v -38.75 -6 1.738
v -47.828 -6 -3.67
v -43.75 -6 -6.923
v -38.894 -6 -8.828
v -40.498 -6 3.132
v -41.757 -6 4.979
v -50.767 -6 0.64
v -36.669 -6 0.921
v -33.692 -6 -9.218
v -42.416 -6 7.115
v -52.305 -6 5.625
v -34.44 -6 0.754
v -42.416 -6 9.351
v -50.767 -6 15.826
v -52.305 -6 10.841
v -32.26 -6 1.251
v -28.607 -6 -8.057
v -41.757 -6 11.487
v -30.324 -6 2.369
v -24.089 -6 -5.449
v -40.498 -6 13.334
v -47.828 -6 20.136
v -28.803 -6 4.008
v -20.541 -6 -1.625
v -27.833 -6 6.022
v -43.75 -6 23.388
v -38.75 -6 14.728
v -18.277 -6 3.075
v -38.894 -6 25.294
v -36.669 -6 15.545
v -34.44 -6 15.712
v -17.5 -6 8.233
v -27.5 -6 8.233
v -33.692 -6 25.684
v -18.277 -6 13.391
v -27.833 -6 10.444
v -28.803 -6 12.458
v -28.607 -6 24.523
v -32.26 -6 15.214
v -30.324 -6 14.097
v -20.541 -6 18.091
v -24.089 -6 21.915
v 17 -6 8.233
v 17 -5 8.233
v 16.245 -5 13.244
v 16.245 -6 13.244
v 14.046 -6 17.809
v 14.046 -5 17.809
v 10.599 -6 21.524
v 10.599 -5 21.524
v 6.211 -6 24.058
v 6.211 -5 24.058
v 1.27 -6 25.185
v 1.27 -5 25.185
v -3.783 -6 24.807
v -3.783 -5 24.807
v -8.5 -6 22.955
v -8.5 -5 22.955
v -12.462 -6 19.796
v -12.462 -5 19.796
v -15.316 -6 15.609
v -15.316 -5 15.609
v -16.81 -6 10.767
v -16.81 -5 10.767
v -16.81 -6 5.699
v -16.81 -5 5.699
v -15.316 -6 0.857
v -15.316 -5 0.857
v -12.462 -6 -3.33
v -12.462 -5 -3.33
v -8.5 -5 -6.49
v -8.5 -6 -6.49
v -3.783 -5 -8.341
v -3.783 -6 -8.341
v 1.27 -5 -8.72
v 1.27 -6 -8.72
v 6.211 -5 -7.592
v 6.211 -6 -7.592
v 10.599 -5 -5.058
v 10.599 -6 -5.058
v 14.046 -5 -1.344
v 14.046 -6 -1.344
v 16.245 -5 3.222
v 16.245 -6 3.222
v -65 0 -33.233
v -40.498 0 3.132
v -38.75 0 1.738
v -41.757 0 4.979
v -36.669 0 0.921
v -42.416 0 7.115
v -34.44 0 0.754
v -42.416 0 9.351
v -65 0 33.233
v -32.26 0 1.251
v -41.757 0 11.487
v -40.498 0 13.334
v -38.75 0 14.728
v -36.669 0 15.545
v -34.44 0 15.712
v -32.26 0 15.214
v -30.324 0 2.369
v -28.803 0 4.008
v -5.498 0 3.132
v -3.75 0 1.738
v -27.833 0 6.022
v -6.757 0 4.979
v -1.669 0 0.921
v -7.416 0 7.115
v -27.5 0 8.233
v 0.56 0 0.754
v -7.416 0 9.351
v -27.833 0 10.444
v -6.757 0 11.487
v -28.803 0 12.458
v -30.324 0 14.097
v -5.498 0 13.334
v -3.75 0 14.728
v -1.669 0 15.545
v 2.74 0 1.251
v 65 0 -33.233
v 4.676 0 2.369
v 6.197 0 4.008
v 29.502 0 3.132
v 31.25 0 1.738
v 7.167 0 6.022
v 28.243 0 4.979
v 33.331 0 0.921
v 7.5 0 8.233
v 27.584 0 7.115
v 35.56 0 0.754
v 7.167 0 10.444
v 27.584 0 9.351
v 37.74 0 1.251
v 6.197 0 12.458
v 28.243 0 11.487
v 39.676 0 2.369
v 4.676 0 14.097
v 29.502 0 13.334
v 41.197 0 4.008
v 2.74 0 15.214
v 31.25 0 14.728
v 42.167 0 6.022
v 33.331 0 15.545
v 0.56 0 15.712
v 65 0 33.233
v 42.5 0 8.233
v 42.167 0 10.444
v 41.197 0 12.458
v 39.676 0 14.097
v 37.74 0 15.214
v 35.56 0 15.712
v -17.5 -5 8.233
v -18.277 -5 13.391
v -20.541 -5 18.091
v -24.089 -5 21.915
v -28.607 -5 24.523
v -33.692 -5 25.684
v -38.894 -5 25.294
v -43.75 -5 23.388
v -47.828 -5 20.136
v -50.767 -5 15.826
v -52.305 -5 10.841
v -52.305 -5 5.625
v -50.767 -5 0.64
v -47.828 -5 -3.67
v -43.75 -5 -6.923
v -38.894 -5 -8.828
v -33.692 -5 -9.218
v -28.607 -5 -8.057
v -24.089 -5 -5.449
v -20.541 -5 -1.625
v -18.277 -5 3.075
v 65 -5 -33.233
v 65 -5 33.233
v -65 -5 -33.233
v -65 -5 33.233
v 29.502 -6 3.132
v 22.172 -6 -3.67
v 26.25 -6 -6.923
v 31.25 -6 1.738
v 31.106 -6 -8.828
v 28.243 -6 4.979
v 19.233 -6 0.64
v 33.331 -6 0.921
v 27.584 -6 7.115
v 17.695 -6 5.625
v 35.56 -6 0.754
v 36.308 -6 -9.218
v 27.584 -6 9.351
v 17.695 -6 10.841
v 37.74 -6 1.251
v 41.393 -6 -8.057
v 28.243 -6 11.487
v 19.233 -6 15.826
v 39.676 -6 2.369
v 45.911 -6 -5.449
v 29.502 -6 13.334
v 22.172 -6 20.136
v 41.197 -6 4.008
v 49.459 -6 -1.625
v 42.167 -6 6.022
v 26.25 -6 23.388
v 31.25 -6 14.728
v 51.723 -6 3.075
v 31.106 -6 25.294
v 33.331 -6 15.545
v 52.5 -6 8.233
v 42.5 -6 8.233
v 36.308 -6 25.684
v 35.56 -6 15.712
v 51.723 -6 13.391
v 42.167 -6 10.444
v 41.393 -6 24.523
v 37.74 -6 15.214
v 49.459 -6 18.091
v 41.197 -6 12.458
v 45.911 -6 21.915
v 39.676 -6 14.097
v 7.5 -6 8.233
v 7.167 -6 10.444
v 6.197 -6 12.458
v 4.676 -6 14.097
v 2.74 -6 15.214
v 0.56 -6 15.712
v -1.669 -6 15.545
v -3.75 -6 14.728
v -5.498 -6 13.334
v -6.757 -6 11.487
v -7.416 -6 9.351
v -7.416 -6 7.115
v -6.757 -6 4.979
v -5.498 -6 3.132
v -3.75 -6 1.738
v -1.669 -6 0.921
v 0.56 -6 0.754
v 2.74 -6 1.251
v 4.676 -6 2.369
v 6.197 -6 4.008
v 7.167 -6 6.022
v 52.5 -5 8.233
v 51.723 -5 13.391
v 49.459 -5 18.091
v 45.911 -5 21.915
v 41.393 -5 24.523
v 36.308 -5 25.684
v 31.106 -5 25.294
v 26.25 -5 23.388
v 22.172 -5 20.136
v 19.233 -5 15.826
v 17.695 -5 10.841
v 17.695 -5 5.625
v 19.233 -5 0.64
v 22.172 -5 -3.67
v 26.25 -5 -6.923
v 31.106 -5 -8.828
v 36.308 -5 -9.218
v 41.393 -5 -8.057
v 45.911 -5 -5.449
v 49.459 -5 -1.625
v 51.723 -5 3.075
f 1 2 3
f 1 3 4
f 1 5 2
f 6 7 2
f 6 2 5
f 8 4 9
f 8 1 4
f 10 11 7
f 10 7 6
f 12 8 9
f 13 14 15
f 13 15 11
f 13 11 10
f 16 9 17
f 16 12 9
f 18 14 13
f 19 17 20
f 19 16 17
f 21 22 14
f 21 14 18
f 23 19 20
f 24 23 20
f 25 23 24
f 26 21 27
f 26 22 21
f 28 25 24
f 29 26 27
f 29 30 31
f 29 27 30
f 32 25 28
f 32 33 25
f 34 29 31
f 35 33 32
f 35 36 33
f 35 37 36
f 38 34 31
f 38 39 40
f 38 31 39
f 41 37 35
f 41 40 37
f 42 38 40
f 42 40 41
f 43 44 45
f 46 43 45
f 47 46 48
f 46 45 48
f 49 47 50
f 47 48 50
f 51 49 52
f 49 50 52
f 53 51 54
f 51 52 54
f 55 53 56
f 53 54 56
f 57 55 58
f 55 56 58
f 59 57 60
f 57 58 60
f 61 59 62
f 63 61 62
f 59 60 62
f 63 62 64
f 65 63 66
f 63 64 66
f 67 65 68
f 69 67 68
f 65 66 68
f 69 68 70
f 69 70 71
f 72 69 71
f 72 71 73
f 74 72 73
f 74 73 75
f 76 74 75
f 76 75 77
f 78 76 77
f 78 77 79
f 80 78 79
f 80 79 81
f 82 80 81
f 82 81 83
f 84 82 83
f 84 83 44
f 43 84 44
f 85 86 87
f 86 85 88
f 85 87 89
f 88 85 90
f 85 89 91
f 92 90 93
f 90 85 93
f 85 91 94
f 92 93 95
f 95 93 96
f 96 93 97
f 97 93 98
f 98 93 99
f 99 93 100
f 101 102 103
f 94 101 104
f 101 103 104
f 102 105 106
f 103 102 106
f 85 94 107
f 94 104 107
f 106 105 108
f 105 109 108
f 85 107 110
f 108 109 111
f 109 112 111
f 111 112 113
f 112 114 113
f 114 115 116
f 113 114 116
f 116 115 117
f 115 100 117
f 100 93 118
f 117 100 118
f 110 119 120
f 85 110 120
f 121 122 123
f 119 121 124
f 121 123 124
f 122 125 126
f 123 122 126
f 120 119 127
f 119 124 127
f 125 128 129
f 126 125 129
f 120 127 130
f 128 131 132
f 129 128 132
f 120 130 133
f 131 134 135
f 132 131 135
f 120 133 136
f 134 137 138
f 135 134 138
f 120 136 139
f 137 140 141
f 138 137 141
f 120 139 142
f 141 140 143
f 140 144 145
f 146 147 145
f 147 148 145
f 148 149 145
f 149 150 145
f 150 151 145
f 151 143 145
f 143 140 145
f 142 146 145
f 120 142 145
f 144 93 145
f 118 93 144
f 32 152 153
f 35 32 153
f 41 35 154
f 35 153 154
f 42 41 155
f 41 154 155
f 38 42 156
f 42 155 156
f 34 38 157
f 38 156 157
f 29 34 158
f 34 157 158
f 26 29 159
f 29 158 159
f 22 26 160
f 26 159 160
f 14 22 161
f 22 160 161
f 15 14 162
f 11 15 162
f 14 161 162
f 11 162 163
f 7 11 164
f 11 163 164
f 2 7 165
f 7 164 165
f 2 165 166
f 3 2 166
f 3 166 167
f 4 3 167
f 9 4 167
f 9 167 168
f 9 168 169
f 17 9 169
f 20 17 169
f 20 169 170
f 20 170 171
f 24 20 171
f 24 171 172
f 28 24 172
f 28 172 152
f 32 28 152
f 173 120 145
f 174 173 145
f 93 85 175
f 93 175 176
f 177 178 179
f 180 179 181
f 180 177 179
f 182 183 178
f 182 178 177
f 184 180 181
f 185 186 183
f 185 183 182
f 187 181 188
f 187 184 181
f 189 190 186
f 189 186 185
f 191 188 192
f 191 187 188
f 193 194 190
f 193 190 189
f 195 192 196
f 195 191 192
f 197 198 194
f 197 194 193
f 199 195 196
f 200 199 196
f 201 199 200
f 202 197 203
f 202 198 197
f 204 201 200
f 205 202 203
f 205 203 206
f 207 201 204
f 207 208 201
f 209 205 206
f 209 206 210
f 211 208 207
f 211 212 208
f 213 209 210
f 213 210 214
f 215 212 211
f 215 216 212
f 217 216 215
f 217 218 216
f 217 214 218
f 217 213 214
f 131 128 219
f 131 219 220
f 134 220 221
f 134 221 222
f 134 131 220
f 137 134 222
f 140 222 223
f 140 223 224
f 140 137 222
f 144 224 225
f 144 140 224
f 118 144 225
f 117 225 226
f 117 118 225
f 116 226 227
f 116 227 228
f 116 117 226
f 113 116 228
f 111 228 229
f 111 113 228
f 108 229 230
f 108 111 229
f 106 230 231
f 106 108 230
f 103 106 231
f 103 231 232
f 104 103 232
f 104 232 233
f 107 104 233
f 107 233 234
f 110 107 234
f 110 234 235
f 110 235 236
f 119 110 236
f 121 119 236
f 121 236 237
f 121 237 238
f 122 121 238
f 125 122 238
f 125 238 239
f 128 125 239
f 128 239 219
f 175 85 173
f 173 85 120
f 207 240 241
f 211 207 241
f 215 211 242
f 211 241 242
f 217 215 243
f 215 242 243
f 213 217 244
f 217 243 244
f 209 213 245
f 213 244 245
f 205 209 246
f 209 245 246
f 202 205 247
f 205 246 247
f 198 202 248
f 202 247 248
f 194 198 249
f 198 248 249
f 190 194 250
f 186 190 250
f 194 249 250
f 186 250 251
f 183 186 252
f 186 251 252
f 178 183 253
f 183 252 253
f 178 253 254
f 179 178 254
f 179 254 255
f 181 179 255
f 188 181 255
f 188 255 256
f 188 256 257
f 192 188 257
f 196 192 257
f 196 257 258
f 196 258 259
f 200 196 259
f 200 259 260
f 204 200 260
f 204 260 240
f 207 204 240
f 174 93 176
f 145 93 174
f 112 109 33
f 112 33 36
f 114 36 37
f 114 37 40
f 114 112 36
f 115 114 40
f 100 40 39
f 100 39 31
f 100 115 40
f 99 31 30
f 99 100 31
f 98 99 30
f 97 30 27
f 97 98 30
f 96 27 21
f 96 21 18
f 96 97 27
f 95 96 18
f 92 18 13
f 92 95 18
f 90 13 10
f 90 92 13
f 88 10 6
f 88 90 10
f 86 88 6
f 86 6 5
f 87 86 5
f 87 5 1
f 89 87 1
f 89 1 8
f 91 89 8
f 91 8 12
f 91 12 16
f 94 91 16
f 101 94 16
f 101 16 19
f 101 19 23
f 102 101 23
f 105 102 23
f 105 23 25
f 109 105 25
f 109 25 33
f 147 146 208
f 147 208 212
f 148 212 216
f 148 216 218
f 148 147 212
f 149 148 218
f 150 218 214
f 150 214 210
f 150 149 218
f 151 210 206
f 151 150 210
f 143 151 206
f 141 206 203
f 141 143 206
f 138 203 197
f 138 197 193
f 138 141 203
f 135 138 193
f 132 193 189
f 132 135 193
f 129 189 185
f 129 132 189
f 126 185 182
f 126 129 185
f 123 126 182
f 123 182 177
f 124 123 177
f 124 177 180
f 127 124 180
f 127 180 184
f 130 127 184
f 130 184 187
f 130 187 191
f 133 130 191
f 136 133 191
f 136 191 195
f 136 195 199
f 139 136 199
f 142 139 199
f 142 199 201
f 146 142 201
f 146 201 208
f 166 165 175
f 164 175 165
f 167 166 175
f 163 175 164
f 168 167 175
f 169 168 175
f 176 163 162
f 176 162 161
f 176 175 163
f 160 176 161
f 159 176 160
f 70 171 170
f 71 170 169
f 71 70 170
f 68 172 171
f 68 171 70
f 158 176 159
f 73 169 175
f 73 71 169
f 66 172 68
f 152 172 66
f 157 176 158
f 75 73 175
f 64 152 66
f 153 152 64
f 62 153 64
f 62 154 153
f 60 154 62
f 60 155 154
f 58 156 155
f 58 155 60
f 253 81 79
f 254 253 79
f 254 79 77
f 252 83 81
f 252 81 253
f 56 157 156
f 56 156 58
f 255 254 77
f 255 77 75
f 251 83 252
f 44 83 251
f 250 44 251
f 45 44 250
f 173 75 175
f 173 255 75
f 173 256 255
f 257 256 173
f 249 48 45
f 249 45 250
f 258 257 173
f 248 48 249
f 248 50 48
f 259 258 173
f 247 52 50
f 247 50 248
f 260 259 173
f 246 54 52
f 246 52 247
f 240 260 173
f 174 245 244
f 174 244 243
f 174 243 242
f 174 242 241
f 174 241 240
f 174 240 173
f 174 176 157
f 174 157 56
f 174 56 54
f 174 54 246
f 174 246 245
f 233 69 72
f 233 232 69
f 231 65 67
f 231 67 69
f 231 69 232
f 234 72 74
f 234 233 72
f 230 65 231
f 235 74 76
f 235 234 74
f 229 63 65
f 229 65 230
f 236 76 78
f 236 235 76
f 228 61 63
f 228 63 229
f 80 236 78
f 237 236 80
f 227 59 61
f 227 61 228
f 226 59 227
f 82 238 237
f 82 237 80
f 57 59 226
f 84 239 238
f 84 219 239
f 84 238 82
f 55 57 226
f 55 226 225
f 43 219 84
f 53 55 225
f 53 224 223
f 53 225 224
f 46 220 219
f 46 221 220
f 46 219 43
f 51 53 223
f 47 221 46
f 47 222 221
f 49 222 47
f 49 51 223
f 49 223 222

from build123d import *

# Parameters (mm, degrees)
F0_W     = 130
F0_H     = 66.465674
F0_R     = 17.5
F0_R_2   = 7.5
F0_R_3   = 17
F1_DEPTH = 5
F2_DEPTH = 6
F3_DEPTH = 6
F4_DEPTH = 6


with BuildPart() as f1:
    # F0 (on Front) → F1 (new body)
    with BuildSketch(Plane.XZ):
        Rectangle(F0_W, F0_H)
        with Locations((-35, 8.232837)):
            Circle(F0_R, mode=Mode.SUBTRACT)
        with BuildLine():
            ThreePointArc((-17.5, 8.232837), (0, 25.732837), (17.5, 8.232837))
            ThreePointArc((17.5, 8.232837), (0, -9.267163), (-17.5, 8.232837))
        make_face(mode=Mode.SUBTRACT)
        with BuildLine():
            ThreePointArc((17.5, 8.232837), (35, 25.732837), (52.5, 8.232837))
            ThreePointArc((52.5, 8.232837), (35, -9.267163), (17.5, 8.232837))
        make_face(mode=Mode.SUBTRACT)
        with Locations((-35, 8.232837)):
            Circle(F0_R)
        with Locations((-35, 8.232837)):
            Circle(F0_R_2, mode=Mode.SUBTRACT)
        with BuildLine():
            ThreePointArc((-17.5, 8.232837), (0, -9.267163), (17.5, 8.232837))
            ThreePointArc((17.5, 8.232837), (0, 25.732837), (-17.5, 8.232837))
        make_face()
        with Locations((0, 8.232837)):
            Circle(F0_R_3, mode=Mode.SUBTRACT)
        with BuildLine():
            ThreePointArc((17.5, 8.232837), (35, -9.267163), (52.5, 8.232837))
            ThreePointArc((52.5, 8.232837), (35, 25.732837), (17.5, 8.232837))
        make_face()
        with Locations((35, 8.232837)):
            Circle(F0_R_2, mode=Mode.SUBTRACT)
        with Locations((0, 8.232837)):
            Circle(F0_R_3)
        with Locations((0, 8.232837)):
            Circle(F0_R_2, mode=Mode.SUBTRACT)
    extrude(amount=F1_DEPTH)

    # F0 (on Front) → F2 (join)
    with BuildSketch(Plane.XZ):
        with BuildLine():
            ThreePointArc((17.5, 8.232837), (35, -9.267163), (52.5, 8.232837))
            ThreePointArc((52.5, 8.232837), (35, 25.732837), (17.5, 8.232837))
        make_face()
        with Locations((35, 8.232837)):
            Circle(F0_R_2, mode=Mode.SUBTRACT)
    extrude(amount=F2_DEPTH)

    # F0 (on Front) → F3 (join)
    with BuildSketch(Plane.XZ):
        with Locations((-35, 8.232837)):
            Circle(F0_R)
        with Locations((-35, 8.232837)):
            Circle(F0_R_2, mode=Mode.SUBTRACT)
    extrude(amount=F3_DEPTH)

    # F0 (on Front) → F4 (join)
    with BuildSketch(Plane.XZ):
        with Locations((0, 8.232837)):
            Circle(F0_R_3)
        with Locations((0, 8.232837)):
            Circle(F0_R_2, mode=Mode.SUBTRACT)
    extrude(amount=F4_DEPTH)


solid = f1.part
